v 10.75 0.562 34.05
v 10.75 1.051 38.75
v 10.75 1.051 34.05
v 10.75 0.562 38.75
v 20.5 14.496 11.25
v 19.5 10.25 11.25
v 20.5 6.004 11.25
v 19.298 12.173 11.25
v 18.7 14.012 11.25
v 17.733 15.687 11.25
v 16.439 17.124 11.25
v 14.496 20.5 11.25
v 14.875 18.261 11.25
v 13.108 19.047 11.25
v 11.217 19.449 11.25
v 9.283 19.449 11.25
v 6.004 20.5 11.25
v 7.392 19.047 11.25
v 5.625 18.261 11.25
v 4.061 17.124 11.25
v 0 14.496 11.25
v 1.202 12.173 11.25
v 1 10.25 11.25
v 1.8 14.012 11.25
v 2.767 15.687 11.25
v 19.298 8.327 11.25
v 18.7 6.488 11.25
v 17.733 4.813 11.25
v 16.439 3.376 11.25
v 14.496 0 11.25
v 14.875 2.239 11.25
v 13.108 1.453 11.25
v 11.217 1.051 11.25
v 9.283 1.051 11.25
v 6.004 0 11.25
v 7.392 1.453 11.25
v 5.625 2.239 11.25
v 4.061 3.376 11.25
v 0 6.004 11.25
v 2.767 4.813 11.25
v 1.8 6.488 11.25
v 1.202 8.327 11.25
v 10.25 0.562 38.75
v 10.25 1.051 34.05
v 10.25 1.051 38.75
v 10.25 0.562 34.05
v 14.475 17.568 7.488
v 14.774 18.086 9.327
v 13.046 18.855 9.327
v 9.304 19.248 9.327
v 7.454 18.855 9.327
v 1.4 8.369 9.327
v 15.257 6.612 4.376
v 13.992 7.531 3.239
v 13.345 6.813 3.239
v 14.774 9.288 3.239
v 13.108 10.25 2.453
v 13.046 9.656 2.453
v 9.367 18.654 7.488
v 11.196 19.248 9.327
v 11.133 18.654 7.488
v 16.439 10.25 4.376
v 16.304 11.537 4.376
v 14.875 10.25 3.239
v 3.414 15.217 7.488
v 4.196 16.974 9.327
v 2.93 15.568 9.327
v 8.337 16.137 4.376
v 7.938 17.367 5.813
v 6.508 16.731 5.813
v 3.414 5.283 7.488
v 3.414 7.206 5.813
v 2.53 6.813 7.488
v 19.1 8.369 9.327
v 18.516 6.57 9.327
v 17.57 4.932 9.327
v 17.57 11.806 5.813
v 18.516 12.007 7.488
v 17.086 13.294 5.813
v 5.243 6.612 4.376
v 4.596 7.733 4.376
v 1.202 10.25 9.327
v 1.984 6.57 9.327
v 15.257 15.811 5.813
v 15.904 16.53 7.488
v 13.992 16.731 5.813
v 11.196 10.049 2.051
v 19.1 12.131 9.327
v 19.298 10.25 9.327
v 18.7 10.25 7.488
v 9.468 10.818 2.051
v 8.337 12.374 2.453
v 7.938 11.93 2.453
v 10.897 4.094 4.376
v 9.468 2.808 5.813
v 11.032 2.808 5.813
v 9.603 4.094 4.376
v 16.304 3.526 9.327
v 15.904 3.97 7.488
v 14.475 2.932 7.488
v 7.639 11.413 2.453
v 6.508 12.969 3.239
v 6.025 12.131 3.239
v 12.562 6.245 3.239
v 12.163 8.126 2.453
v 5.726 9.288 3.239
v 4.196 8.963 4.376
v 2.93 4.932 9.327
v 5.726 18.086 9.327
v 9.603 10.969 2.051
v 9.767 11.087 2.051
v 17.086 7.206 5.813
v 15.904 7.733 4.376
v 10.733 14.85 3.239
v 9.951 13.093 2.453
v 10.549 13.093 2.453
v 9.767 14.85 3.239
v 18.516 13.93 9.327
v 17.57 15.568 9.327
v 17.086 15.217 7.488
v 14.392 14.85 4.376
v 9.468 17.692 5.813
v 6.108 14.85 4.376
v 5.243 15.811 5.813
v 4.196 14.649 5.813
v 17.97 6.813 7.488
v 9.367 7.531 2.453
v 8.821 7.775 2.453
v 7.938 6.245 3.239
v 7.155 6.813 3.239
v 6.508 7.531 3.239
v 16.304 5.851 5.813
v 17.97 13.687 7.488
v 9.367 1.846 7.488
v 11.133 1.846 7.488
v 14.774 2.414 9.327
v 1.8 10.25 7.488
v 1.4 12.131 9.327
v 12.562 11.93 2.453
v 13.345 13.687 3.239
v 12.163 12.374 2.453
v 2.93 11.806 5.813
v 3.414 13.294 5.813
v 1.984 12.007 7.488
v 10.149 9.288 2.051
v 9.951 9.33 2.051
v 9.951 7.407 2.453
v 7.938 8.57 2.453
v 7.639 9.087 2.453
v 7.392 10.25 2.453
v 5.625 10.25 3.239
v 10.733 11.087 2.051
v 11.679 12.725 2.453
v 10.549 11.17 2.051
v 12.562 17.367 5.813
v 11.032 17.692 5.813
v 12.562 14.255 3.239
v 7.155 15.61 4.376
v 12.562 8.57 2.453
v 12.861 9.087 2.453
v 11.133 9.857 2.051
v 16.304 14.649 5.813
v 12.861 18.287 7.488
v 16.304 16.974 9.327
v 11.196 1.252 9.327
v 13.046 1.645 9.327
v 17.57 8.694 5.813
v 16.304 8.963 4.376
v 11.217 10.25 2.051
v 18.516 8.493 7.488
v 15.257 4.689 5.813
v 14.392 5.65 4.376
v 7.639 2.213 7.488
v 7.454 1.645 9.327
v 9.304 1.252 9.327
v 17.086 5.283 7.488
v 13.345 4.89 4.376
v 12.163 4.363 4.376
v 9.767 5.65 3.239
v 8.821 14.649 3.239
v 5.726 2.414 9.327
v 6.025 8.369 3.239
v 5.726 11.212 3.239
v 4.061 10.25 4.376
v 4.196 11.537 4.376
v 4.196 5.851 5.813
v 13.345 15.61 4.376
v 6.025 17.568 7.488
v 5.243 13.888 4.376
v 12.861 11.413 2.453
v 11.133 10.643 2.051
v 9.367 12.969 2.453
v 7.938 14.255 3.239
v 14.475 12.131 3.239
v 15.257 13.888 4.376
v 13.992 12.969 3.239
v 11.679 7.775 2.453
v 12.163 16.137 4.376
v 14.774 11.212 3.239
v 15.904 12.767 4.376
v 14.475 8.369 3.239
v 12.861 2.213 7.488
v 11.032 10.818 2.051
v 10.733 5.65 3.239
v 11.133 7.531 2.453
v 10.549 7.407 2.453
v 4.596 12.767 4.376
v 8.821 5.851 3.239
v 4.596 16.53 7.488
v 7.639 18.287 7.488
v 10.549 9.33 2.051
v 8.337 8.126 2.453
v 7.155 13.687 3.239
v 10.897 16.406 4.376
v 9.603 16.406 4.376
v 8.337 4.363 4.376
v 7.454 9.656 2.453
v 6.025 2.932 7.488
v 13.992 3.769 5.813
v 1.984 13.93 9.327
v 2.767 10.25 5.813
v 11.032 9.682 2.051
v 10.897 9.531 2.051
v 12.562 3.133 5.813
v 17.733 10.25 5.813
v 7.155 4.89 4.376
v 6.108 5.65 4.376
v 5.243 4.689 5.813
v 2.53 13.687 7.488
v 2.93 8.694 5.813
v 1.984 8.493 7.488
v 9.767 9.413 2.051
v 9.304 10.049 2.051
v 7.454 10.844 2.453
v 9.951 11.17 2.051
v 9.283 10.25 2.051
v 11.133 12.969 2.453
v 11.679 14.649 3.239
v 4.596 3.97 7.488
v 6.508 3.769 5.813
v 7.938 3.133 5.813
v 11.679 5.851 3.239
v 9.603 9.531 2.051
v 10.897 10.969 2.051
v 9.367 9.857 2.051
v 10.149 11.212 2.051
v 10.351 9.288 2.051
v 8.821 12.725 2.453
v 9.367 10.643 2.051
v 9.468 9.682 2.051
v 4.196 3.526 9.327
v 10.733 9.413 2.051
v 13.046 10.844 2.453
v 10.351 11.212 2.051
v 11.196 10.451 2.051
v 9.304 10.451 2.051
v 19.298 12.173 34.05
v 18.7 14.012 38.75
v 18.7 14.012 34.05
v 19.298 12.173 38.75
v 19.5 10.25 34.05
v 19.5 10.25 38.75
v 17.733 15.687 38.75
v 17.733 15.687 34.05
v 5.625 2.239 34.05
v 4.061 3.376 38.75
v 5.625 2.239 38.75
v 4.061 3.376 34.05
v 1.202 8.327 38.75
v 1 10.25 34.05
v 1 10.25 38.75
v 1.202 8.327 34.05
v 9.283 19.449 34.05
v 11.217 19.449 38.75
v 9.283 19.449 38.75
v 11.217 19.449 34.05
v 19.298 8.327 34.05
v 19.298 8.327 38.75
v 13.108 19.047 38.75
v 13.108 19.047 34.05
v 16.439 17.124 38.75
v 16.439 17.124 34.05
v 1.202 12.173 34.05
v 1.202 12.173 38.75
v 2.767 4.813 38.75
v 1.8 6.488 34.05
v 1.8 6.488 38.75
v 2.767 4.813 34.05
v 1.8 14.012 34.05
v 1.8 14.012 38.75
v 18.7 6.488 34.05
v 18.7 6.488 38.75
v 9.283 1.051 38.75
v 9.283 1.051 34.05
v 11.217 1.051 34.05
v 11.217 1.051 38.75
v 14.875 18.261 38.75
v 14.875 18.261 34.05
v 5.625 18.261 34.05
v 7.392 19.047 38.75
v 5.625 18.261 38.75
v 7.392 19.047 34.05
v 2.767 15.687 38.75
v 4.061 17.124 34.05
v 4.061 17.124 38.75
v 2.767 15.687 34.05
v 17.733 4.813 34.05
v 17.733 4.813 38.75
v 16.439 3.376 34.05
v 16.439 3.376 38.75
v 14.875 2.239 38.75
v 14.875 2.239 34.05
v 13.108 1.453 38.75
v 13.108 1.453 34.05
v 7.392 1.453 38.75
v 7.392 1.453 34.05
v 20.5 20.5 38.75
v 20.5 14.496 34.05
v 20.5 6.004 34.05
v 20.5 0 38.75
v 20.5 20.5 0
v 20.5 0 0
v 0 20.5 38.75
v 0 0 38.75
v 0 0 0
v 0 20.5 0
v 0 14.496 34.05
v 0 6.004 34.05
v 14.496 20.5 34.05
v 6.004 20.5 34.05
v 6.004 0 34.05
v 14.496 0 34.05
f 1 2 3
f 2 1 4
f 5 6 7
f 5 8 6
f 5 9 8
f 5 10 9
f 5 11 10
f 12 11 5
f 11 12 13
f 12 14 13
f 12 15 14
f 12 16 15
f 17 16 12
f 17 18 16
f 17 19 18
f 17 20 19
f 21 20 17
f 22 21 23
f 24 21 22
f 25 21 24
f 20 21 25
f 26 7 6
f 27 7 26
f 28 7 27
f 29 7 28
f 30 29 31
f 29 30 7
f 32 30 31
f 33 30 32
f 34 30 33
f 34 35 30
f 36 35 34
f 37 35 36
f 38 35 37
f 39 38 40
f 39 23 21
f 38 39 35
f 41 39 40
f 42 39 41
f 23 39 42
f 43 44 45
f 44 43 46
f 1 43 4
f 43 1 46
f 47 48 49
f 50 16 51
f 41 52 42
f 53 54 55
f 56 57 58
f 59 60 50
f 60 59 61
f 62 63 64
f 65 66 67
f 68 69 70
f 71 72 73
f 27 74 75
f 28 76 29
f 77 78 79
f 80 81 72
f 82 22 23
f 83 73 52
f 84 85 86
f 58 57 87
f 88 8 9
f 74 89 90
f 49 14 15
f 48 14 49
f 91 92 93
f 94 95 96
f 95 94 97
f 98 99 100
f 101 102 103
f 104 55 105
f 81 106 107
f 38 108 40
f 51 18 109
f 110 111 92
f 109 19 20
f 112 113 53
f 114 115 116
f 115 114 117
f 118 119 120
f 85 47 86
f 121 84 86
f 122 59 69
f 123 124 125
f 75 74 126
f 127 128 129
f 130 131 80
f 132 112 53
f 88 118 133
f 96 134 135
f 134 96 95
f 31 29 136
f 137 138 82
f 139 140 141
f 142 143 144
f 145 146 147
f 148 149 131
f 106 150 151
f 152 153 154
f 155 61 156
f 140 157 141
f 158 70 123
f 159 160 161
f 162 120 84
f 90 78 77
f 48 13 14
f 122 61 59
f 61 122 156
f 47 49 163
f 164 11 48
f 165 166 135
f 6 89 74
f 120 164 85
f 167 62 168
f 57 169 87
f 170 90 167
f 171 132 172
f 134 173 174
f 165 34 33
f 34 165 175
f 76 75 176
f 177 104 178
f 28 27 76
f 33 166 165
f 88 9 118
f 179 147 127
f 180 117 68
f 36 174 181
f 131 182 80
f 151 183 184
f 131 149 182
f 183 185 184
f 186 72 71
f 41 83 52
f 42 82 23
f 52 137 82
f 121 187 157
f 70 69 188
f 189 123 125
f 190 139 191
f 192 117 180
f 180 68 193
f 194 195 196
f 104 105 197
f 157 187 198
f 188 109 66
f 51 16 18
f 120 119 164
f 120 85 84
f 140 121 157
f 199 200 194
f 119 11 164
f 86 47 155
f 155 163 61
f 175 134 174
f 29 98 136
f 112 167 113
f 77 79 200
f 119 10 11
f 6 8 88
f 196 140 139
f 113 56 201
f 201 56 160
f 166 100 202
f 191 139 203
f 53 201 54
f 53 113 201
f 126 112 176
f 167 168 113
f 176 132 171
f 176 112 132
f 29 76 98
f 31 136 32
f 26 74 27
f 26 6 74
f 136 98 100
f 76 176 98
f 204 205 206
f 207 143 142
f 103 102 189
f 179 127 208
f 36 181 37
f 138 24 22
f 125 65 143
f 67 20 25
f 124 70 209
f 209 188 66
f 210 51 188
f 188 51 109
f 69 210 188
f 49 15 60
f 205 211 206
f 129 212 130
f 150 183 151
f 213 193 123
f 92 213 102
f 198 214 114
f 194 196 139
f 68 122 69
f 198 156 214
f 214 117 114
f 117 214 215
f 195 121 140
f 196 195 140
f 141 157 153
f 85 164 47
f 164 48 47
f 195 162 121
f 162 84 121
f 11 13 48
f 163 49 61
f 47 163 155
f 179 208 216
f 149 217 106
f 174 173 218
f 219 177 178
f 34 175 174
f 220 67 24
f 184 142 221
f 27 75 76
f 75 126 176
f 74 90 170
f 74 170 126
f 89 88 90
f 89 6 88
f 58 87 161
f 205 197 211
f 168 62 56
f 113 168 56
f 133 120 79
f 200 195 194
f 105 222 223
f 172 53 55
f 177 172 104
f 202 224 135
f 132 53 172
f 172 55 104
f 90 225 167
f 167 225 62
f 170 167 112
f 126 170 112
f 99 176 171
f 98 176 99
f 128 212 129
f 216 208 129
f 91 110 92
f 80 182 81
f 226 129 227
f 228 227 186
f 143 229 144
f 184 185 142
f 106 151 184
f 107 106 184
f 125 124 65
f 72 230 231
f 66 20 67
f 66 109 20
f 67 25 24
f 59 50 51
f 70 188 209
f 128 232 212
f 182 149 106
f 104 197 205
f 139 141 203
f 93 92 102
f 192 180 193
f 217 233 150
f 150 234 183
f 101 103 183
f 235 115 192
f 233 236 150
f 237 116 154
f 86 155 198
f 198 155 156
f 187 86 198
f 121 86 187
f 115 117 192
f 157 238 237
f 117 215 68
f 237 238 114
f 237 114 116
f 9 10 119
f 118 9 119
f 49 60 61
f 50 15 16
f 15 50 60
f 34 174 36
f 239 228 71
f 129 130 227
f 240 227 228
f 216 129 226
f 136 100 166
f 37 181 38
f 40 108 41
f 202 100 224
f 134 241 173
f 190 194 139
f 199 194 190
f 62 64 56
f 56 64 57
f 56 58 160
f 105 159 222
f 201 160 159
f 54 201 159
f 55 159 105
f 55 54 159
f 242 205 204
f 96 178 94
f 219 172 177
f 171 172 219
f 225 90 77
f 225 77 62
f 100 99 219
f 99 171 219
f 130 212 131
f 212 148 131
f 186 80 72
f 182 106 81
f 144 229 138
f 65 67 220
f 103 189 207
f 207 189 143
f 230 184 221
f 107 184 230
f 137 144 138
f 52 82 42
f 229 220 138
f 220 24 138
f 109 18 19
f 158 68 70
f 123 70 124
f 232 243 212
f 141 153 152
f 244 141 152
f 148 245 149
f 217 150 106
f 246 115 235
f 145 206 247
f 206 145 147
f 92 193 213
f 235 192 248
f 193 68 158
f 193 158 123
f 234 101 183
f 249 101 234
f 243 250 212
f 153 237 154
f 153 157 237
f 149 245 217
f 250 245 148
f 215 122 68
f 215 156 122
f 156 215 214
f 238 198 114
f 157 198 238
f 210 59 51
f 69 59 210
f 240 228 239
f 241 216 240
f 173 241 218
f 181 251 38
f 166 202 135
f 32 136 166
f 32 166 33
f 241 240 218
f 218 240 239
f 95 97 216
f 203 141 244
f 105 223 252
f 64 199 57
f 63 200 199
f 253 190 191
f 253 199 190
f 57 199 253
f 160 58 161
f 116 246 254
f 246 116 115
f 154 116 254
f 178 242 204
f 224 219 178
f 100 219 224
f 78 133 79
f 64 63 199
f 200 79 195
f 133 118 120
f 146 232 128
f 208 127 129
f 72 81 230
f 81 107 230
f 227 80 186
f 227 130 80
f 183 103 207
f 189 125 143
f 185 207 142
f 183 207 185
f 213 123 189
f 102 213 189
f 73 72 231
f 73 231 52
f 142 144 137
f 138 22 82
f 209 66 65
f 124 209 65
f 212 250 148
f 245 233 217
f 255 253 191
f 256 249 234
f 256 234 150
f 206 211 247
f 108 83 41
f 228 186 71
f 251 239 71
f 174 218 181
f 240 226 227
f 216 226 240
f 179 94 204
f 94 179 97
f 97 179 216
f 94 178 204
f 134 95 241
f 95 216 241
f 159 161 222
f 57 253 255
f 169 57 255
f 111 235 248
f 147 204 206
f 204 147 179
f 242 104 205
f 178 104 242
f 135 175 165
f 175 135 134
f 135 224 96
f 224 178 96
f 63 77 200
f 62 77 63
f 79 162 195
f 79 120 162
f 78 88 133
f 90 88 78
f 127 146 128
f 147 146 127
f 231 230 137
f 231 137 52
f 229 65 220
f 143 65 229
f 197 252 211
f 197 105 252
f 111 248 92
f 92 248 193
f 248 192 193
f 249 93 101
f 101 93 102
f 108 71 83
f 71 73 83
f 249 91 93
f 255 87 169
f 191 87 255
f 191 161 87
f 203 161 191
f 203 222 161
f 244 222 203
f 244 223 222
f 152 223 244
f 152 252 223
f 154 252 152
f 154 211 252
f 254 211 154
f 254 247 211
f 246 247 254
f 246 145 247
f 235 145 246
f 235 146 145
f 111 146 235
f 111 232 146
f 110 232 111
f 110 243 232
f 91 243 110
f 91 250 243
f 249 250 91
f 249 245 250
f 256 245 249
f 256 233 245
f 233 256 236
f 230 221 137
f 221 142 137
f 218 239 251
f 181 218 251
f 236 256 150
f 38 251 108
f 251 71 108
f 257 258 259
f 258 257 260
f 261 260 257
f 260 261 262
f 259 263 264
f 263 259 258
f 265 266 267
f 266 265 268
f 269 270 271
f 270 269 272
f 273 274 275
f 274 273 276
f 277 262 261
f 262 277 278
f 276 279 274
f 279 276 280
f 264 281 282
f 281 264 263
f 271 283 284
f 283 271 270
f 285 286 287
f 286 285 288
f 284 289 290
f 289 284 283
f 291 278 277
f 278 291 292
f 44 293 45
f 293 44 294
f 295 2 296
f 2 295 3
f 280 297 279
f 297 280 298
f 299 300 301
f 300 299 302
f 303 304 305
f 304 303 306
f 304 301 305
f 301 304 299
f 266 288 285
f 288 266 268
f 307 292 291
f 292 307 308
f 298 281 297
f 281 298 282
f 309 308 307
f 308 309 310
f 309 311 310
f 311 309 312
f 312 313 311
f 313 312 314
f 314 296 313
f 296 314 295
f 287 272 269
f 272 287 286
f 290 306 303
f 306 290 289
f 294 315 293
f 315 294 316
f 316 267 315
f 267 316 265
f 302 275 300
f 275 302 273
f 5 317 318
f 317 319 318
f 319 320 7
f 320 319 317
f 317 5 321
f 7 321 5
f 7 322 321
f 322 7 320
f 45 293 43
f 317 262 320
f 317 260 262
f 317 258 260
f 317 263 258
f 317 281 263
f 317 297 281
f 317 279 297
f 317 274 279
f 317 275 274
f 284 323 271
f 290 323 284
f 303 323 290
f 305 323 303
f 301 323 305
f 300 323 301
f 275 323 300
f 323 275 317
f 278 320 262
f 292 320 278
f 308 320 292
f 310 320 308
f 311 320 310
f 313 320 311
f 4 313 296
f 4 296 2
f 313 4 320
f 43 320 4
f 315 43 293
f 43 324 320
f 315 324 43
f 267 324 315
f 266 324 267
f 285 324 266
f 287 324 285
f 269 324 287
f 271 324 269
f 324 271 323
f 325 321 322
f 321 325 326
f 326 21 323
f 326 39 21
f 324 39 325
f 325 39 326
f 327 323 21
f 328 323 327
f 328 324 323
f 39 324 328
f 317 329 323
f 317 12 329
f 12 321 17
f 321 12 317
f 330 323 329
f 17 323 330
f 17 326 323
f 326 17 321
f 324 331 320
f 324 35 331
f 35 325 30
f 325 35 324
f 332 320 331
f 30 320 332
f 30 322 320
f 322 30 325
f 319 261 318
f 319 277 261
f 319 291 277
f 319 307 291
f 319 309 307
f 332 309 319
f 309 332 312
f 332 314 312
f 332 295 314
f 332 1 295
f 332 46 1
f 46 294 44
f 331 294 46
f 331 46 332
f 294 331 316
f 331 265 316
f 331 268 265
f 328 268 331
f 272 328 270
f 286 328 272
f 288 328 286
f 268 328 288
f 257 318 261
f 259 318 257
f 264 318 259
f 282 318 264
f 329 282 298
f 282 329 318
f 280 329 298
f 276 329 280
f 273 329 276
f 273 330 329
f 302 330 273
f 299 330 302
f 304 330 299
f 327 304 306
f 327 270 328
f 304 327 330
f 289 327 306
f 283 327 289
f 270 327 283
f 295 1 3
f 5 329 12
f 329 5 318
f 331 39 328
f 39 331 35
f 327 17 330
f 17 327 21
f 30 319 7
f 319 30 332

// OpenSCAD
rows = 1;
columns = 1;
radius = 9.25;
height = 38 * 0.75;
depth = height + radius;
offset = 1;
slotsize = (radius+offset)*2;
zpad = 1;
vent = (offset/2);

for (row = [0:rows-1])
    for (column = [0:columns-1])
        translate([column*slotsize,row*slotsize,0]) slot();

module hole() {
    translate([radius,-vent*(7/8),radius]) cube([vent,vent,height]);
    translate([radius,radius,radius]) sphere(radius);
    translate([radius,radius,radius]) cylinder(height,radius,radius);
}

module slot() {
    slotside = (radius+offset) * 2;
    difference() {
        cube([slotsize,slotsize,radius+height+offset]);
        translate([offset,offset,offset+zpad]) hole();
        translate([slotside/2,-(((slotside*sqrt(2))-slotside)/2),offset+zpad+radius]) rotate([0,0,45])  cube([slotsize,slotsize,height*.8]);
    }
}    
